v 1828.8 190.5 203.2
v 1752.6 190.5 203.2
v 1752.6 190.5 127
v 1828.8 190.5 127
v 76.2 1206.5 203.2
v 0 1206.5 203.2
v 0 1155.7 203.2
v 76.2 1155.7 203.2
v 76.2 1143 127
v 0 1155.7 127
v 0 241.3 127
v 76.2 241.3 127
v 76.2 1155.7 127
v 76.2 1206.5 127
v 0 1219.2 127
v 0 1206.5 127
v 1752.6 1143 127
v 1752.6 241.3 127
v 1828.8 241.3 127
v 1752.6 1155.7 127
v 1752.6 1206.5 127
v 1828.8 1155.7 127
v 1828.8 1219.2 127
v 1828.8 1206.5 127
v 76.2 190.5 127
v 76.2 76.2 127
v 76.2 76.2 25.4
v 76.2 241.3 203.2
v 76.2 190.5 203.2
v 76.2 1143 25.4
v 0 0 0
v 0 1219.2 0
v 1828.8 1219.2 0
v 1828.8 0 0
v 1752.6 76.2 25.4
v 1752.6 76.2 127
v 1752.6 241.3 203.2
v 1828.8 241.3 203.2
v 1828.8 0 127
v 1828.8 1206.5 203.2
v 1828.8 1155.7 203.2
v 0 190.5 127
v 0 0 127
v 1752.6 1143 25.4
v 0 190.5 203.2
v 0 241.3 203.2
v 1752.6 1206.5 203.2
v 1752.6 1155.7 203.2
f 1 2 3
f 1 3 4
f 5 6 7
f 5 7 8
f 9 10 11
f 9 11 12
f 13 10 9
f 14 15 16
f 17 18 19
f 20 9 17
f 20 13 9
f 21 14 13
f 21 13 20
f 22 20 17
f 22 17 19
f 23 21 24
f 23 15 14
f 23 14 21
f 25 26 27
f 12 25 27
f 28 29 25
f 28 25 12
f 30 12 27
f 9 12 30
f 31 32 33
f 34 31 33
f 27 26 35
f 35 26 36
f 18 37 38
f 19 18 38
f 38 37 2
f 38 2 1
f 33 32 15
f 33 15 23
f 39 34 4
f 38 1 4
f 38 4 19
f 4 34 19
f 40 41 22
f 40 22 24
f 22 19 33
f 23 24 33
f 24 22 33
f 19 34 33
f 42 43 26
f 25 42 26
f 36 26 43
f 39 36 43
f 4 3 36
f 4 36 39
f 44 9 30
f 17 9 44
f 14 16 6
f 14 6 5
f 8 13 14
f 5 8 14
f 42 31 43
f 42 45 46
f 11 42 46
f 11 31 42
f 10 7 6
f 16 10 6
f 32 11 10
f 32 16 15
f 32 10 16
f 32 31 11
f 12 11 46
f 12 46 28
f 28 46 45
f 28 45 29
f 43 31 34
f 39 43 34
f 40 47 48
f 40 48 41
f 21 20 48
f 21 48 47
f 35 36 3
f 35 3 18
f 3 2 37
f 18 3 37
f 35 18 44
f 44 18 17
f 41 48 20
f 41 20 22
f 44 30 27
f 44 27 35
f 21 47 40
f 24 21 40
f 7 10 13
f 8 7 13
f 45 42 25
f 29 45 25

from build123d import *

# Parameters (mm, degrees)
SKETCH1_W           = 1828.8
SKETCH1_H           = 1219.2
BOSS_EXTRUDE1_DEPTH = 127
SKETCH2_W           = 1676.4
SKETCH2_H           = 1066.8
CUT_EXTRUDE2_DEPTH  = 101.6
SKETCH3_W           = 76.2
SKETCH3_H           = 50.8
BOSS_EXTRUDE2_DEPTH = 76.2
SKETCH4_W           = 76.2
SKETCH4_H           = 50.8
BOSS_EXTRUDE3_DEPTH = 76.2
SKETCH5_W           = 76.2
SKETCH5_H           = 50.8
BOSS_EXTRUDE4_DEPTH = 76.2


with BuildPart() as part:
    # Sketch1 → Boss-Extrude1 (new body)
    with BuildSketch(Plane.XY):
        with Locations((914.4, 609.6)):
            Rectangle(SKETCH1_W, SKETCH1_H)
    extrude(amount=BOSS_EXTRUDE1_DEPTH)

    # Sketch2 → Cut-Extrude2 (cut)
    with BuildSketch(Plane.XY.offset(127)):
        with Locations((914.4, 609.6)):
            Rectangle(SKETCH2_W, SKETCH2_H)
    extrude(amount=-CUT_EXTRUDE2_DEPTH, mode=Mode.SUBTRACT)

    # Sketch3 → Boss-Extrude2 (add)
    with BuildSketch(Plane.XY.offset(127)):
        with Locations((38.1, 1181.1)):
            Rectangle(SKETCH3_W, SKETCH3_H)
    extrude(amount=BOSS_EXTRUDE2_DEPTH)

    # Sketch4 → Boss-Extrude3 (add)
    with BuildSketch(Plane.XY.offset(127)):
        with Locations((1790.7, 1181.1)):
            Rectangle(SKETCH4_W, SKETCH4_H)
    extrude(amount=BOSS_EXTRUDE3_DEPTH)

    # Sketch5 → Boss-Extrude4 (add)
    with BuildSketch(Plane.XY.offset(127)):
        with Locations((38.1, 215.9)):
            Rectangle(SKETCH5_W, SKETCH5_H)
        with Locations((1790.7, 215.9)):
            Rectangle(SKETCH5_W, SKETCH5_H)
    extrude(amount=BOSS_EXTRUDE4_DEPTH)


solid = part.part
